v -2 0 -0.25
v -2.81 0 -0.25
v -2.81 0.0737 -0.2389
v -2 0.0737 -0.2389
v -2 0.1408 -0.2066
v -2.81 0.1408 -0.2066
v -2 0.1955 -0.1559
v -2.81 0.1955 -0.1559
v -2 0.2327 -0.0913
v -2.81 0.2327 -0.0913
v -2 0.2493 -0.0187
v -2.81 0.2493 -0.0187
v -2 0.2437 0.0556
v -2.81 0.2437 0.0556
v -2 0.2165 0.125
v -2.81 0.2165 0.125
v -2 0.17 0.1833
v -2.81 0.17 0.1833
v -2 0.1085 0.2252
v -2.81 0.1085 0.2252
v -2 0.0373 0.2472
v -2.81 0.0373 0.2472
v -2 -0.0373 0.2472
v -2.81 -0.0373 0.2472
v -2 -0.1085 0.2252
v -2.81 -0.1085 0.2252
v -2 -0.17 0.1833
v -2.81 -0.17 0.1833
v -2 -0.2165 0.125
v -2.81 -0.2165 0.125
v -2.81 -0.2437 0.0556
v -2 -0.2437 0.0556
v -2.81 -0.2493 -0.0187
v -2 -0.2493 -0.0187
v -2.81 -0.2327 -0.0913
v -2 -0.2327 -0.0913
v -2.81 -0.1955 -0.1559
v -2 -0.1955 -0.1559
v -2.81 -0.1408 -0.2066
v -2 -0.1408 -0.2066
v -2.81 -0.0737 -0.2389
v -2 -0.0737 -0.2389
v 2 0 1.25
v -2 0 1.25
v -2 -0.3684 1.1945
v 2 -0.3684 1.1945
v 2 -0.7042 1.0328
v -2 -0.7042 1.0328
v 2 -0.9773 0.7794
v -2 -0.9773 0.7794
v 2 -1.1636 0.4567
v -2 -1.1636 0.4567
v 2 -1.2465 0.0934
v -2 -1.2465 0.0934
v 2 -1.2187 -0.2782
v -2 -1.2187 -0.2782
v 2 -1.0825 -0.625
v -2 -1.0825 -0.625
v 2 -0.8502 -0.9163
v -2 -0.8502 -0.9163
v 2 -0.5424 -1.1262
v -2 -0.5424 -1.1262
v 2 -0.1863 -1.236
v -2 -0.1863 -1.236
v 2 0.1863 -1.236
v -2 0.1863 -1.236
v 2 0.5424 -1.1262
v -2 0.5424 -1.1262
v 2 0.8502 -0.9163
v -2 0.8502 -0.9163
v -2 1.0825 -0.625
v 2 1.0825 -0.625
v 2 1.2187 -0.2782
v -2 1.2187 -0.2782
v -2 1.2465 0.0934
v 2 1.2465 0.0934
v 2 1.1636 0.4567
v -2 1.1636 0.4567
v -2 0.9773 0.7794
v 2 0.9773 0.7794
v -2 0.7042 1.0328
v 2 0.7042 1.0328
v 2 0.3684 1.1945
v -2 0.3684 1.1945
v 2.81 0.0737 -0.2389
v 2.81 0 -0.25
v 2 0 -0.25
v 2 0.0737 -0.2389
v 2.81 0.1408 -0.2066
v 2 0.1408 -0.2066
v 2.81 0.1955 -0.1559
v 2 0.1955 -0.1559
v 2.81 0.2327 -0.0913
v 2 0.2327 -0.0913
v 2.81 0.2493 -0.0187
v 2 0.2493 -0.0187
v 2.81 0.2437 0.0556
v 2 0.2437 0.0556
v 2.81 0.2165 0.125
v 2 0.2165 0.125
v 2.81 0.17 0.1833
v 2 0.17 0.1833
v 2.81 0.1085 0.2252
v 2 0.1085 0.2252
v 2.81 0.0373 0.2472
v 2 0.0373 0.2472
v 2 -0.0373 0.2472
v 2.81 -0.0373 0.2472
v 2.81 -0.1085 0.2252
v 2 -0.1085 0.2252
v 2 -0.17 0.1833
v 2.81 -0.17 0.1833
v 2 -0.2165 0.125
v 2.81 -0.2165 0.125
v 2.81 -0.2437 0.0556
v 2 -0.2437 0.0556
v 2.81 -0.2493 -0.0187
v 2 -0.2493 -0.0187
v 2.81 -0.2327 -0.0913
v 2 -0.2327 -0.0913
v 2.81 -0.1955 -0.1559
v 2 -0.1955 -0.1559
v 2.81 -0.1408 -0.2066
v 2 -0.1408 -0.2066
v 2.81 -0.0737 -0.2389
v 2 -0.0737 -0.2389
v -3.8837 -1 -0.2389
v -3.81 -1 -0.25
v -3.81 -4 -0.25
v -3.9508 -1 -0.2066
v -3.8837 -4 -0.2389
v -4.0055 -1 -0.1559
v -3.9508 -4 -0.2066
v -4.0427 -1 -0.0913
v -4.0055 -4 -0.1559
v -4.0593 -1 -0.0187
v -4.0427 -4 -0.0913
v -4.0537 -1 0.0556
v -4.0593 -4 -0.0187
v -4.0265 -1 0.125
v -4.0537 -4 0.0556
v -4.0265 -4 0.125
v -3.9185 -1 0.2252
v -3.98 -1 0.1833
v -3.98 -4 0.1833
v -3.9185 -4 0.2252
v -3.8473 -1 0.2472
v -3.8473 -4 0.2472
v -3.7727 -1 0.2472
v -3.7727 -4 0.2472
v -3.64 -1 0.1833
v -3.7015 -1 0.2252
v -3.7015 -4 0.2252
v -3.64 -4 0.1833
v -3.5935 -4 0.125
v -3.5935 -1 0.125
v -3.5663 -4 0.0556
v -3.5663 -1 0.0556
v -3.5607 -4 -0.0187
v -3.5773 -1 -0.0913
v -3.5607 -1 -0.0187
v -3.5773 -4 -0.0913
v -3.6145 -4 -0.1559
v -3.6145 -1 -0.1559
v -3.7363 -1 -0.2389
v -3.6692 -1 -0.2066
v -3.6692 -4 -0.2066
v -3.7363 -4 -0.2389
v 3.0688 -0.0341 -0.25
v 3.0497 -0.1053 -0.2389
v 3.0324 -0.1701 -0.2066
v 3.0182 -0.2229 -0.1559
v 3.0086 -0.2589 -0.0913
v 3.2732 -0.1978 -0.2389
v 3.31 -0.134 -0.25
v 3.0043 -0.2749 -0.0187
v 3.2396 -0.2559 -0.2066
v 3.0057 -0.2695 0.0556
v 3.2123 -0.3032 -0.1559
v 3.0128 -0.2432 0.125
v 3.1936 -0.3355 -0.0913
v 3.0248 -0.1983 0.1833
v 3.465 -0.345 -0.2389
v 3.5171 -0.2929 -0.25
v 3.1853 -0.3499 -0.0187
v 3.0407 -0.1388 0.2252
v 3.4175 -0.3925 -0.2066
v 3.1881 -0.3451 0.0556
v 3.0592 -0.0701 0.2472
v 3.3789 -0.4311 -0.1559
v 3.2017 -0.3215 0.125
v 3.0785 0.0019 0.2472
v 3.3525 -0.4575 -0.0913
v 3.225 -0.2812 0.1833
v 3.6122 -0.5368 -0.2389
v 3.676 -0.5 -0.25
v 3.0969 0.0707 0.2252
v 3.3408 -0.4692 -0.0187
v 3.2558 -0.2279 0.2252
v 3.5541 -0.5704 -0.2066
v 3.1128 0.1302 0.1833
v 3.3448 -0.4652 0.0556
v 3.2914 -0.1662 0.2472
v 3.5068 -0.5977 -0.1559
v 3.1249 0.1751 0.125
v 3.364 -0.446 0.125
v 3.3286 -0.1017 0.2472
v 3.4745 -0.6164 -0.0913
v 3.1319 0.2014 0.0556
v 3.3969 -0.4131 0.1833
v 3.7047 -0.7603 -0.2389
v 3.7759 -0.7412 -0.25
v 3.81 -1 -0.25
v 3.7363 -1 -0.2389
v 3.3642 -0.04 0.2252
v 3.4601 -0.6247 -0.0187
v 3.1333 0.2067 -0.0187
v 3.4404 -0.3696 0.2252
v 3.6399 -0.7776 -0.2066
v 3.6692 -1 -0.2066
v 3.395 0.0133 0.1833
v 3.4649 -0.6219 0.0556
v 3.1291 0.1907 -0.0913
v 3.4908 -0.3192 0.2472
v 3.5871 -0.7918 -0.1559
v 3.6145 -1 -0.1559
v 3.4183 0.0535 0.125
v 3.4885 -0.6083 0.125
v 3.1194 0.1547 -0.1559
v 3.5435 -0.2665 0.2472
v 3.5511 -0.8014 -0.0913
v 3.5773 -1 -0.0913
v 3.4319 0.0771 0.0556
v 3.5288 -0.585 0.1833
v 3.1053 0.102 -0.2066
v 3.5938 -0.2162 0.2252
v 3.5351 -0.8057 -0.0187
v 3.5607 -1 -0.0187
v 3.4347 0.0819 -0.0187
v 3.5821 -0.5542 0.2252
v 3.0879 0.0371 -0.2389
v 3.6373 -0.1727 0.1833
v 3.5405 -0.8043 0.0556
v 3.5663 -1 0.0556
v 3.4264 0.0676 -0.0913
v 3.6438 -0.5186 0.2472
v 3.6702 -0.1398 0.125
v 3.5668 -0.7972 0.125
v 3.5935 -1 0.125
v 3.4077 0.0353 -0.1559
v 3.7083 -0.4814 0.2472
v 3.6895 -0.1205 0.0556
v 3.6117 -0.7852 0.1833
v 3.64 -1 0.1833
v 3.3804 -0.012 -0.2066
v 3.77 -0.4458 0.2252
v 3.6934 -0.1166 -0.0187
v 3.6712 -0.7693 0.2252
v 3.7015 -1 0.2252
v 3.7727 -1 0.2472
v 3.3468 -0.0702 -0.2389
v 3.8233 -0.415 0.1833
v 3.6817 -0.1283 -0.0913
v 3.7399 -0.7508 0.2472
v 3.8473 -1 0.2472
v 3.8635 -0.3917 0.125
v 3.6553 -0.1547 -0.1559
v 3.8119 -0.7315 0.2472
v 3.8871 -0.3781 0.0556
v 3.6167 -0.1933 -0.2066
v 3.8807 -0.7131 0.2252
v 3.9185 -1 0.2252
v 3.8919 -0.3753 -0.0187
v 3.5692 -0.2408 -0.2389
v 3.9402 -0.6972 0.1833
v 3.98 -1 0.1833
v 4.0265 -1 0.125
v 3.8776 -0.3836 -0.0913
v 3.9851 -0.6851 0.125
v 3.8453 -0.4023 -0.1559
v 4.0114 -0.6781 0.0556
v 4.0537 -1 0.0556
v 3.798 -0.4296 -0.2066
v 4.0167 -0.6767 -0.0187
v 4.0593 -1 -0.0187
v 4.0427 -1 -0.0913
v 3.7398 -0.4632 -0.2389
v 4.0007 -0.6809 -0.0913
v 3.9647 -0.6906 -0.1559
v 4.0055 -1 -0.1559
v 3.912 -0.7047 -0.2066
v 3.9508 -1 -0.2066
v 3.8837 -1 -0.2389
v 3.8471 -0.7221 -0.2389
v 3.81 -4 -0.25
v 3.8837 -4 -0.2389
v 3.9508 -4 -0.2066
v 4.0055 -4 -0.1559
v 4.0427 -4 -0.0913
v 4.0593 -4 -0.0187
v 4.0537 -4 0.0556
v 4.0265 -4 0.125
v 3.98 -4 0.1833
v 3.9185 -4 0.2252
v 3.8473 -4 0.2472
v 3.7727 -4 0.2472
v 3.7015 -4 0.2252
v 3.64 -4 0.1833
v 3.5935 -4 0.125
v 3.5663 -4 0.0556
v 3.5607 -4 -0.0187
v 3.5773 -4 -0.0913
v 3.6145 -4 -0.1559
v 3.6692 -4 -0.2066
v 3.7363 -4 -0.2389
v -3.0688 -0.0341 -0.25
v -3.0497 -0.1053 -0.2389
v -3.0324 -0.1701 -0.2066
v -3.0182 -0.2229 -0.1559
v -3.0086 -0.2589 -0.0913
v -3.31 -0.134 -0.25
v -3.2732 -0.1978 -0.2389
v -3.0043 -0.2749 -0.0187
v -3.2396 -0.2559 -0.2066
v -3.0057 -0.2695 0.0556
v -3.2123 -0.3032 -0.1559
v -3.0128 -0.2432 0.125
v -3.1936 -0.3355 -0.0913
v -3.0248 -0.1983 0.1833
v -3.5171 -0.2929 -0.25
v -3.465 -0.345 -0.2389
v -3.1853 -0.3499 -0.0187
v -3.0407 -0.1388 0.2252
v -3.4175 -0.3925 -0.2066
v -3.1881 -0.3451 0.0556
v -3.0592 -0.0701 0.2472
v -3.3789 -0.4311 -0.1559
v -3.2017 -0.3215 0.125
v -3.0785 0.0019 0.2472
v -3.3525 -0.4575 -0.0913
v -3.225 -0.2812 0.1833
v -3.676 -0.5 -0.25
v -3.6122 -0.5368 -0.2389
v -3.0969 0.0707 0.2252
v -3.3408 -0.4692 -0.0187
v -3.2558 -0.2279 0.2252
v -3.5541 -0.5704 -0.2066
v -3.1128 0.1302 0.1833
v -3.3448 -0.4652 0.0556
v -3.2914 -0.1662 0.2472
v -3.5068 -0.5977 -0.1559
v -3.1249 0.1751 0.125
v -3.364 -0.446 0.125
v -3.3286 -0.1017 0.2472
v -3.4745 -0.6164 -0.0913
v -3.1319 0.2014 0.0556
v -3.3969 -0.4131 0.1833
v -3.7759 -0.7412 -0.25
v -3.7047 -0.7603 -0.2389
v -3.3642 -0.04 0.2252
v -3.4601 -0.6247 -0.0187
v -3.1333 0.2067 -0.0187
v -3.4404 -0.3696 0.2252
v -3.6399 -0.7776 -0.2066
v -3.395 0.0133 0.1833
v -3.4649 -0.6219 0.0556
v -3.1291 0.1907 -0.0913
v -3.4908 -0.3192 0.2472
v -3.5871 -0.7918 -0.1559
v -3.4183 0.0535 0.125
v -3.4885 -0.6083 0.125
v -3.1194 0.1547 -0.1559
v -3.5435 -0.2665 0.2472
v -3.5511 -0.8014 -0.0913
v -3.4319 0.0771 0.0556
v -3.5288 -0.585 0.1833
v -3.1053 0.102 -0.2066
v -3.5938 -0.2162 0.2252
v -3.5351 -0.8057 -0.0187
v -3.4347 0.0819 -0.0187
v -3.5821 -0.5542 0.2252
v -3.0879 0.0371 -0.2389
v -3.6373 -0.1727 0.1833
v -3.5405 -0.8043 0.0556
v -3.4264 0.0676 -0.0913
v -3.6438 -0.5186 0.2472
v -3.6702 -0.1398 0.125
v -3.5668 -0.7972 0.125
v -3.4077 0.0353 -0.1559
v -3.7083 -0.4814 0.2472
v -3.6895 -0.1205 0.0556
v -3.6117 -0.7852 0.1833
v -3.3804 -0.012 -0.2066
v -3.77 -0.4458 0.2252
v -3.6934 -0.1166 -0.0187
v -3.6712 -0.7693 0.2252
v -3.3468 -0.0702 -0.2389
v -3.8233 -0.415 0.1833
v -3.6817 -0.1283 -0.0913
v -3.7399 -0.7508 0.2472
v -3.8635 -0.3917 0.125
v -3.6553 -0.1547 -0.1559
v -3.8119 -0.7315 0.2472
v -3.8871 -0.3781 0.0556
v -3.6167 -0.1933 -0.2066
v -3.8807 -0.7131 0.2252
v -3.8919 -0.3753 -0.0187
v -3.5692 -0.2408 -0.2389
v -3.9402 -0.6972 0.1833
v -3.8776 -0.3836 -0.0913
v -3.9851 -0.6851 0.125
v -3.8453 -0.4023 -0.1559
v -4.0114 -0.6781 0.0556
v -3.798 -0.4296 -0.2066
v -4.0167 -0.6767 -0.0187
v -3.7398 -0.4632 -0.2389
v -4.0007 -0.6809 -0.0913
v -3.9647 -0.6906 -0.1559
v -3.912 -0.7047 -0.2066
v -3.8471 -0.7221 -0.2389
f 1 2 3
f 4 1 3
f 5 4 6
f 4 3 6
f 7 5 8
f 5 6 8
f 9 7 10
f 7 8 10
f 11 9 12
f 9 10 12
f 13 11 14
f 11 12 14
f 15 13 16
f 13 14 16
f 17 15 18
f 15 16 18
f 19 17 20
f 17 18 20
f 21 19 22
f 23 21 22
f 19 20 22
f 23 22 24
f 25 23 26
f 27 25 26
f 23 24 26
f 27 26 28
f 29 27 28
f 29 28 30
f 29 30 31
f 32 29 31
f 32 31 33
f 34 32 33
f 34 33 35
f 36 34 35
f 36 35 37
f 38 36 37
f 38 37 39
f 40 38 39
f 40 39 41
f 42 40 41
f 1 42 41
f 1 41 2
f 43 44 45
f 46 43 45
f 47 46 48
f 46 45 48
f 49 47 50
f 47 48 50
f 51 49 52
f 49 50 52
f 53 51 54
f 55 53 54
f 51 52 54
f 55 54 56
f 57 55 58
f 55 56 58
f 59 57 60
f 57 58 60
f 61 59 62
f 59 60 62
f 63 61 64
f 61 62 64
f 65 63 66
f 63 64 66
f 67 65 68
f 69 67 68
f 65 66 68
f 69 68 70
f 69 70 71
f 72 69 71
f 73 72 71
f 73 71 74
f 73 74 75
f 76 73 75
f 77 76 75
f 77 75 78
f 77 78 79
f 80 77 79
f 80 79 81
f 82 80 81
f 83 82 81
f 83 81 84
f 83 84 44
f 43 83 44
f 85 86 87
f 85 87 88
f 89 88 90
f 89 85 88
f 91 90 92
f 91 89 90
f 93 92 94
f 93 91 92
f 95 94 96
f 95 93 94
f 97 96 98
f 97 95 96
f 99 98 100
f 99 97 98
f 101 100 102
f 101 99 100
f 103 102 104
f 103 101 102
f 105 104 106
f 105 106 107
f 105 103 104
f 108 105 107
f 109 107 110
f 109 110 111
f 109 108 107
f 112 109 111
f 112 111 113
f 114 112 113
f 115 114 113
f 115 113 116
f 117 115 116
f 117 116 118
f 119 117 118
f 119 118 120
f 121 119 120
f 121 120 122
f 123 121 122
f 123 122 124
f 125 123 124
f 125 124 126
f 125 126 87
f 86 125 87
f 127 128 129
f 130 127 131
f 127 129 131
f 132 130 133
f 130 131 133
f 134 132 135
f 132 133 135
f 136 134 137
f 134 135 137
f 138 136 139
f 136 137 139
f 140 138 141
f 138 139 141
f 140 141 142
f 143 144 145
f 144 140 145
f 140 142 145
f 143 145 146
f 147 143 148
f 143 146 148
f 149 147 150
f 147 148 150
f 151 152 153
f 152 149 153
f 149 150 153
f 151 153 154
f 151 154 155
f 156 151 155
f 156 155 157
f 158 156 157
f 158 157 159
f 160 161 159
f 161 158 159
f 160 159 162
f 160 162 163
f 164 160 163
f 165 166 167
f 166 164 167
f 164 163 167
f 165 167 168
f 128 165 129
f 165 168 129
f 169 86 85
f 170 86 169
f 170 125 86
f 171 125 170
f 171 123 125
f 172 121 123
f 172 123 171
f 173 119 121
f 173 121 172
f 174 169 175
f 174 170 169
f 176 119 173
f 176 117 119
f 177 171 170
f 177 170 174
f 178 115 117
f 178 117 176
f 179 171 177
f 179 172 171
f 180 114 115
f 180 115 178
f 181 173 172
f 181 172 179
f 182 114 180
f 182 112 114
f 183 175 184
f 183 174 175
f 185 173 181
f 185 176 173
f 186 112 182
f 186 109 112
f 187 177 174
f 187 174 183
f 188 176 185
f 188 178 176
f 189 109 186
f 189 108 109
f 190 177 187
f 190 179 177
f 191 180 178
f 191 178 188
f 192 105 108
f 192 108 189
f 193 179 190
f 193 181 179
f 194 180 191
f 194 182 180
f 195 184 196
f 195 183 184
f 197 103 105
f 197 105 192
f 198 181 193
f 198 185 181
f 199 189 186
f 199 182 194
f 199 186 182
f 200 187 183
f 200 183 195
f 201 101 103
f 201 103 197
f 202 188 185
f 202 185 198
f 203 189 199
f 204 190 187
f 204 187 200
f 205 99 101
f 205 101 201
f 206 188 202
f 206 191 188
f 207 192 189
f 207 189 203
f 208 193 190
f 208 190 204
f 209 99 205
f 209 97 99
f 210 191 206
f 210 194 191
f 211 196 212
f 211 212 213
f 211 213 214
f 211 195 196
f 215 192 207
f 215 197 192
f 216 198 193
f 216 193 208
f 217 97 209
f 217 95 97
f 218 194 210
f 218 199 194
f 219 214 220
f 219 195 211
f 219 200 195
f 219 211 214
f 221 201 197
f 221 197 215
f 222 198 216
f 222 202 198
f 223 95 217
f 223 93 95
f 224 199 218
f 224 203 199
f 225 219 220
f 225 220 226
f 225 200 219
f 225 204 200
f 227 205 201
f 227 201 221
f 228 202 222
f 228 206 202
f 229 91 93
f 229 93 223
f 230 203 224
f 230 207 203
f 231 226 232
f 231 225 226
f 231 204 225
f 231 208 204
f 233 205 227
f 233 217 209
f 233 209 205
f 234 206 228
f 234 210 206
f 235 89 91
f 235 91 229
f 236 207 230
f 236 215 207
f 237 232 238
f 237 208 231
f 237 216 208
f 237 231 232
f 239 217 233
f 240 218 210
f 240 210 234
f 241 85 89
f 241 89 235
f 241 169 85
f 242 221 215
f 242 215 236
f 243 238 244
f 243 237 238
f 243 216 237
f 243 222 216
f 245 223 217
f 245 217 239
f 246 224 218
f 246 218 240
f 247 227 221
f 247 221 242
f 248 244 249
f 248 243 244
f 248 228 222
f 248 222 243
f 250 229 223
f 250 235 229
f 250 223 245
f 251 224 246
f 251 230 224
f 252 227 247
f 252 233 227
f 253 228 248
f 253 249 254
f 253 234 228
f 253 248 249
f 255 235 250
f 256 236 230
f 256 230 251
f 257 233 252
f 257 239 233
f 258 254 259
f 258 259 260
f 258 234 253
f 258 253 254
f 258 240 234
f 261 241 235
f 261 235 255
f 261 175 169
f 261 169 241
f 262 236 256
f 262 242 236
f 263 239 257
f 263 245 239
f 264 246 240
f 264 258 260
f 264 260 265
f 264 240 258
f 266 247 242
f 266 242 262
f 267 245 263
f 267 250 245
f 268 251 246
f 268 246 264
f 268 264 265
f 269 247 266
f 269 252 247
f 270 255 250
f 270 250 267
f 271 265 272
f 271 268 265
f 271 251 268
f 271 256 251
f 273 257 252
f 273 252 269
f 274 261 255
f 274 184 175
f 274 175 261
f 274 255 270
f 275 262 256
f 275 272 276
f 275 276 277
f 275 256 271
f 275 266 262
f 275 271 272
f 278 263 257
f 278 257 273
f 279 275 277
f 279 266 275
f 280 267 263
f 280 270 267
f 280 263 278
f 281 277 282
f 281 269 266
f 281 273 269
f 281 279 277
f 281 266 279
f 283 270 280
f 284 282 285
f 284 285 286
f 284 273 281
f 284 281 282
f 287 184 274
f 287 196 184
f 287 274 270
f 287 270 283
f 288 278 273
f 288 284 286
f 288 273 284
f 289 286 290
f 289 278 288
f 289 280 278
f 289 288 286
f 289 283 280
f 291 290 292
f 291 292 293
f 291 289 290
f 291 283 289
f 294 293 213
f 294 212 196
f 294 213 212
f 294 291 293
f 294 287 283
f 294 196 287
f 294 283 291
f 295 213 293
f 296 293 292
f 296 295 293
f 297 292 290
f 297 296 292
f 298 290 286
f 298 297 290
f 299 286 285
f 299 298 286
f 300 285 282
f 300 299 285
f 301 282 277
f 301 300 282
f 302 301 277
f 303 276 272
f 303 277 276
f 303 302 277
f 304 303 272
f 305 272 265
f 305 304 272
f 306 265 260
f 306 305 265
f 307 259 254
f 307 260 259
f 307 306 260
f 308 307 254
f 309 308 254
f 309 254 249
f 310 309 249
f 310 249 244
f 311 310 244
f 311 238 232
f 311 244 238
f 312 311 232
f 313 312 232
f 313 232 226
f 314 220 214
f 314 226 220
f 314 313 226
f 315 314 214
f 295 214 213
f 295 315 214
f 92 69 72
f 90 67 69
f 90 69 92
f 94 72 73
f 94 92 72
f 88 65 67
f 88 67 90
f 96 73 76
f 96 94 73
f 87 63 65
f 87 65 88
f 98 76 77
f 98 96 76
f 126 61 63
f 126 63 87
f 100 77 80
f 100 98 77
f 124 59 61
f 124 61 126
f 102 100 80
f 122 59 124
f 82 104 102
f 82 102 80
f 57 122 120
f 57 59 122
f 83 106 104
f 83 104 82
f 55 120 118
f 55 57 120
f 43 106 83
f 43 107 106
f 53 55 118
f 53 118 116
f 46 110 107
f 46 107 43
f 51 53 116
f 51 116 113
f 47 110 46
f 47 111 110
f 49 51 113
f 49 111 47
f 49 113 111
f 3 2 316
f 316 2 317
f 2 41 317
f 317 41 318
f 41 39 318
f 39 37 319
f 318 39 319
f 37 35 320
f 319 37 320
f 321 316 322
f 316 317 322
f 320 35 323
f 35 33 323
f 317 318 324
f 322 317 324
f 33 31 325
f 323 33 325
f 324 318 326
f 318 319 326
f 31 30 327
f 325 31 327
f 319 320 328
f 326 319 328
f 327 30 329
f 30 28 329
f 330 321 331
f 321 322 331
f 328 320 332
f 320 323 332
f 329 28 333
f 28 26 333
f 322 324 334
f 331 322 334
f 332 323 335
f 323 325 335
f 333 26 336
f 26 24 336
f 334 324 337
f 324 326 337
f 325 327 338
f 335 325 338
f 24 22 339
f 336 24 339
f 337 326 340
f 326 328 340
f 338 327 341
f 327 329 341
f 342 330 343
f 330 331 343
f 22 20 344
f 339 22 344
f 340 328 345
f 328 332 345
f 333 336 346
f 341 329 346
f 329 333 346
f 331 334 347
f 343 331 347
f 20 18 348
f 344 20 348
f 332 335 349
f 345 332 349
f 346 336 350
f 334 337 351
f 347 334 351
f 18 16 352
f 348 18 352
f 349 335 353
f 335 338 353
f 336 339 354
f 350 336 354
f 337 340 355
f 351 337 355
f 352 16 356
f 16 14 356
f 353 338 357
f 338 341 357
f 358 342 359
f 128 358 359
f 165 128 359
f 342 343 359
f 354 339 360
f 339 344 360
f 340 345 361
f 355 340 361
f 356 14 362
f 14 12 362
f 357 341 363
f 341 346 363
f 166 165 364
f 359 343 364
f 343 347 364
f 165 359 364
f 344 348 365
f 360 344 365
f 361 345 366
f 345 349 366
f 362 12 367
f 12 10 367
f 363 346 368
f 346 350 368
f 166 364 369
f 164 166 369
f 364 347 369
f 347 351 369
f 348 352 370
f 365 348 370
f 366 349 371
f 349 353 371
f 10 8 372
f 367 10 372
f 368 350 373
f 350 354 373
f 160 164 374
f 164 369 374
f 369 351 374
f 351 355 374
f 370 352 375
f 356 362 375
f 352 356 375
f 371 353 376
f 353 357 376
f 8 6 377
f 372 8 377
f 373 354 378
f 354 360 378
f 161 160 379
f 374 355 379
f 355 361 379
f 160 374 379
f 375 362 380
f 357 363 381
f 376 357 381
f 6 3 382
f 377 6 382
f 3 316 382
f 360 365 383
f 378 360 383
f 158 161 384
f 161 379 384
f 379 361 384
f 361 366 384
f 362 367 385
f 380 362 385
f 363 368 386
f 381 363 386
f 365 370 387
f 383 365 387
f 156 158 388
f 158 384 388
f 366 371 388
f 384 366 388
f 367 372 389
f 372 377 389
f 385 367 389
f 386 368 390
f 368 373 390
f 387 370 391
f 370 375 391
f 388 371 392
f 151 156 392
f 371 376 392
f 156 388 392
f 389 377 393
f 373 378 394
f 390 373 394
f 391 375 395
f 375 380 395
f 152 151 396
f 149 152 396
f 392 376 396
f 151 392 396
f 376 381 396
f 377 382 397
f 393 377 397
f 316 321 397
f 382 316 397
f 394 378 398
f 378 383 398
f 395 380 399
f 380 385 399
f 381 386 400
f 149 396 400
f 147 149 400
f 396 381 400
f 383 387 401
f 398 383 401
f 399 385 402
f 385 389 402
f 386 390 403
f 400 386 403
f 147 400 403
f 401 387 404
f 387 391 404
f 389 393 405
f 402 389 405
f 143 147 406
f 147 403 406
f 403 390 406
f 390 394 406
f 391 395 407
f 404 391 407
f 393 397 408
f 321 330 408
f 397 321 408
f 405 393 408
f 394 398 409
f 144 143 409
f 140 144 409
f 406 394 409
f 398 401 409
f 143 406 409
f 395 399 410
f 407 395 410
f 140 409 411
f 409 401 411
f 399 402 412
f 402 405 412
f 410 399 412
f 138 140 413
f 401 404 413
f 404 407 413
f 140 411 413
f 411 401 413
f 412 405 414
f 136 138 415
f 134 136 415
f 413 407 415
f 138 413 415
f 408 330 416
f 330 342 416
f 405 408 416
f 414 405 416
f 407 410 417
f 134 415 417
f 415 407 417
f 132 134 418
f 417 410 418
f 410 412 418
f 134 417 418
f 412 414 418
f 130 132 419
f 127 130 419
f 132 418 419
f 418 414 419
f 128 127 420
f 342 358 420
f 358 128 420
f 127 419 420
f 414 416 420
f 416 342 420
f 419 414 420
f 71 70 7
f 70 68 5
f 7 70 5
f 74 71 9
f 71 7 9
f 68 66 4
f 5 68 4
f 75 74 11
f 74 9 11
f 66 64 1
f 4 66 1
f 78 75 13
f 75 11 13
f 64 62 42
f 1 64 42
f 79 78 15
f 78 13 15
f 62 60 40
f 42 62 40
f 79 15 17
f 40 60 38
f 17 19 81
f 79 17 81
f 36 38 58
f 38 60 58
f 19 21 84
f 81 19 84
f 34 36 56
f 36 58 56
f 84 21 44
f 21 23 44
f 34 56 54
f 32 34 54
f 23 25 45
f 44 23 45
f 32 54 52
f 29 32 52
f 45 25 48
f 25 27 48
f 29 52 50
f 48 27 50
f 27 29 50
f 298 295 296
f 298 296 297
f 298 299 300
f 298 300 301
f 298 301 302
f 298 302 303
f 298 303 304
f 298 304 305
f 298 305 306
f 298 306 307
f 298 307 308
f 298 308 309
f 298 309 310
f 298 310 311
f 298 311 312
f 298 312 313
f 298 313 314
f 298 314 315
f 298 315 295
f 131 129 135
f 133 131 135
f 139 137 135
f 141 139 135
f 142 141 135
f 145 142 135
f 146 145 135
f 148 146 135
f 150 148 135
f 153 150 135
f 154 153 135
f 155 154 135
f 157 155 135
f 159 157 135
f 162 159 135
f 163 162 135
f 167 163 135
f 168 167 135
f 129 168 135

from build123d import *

# Parameters (mm, degrees)
SKETCH2_W = 2
SKETCH2_H = 1.25
SKETCH3_R = 0.25


with BuildPart() as part:
    # Sketch2 → Revolve1 (revolve)
    with BuildSketch(Plane.XY, mode=Mode.PRIVATE) as revolve1_sk:
        with Locations((1, -0.625)):
            Rectangle(SKETCH2_W, SKETCH2_H)
    revolve1 = revolve(revolve1_sk.sketch.rotate(Axis((0, 0, 0), (1, 0, 0)), 270), axis=Axis((0, 0, 0), (1, 0, 0)))

    # Sweep1: sweep along a path in Sketch1
    with BuildLine(Plane.XY) as sweep1_path:
        Line((2, 0), (2.81, 0))
        ThreePointArc((2.81, 0), (3.517106781, -0.292893219), (3.81, -1))
        Line((3.81, -1), (3.81, -4))
    # Sketch3 → Sweep1 (sweep)
    with BuildSketch(Plane(origin=(2, 0, 0), x_dir=(0, 0, -1), z_dir=(1, 0, 0))):
        Circle(SKETCH3_R)
    sweep1 = sweep(path=sweep1_path.line)

    # Mirror1: Revolve1, Sweep1 across plane
    add(revolve1.mirror(Plane.ZY))
    add(sweep1.mirror(Plane.ZY))


solid = part.part
